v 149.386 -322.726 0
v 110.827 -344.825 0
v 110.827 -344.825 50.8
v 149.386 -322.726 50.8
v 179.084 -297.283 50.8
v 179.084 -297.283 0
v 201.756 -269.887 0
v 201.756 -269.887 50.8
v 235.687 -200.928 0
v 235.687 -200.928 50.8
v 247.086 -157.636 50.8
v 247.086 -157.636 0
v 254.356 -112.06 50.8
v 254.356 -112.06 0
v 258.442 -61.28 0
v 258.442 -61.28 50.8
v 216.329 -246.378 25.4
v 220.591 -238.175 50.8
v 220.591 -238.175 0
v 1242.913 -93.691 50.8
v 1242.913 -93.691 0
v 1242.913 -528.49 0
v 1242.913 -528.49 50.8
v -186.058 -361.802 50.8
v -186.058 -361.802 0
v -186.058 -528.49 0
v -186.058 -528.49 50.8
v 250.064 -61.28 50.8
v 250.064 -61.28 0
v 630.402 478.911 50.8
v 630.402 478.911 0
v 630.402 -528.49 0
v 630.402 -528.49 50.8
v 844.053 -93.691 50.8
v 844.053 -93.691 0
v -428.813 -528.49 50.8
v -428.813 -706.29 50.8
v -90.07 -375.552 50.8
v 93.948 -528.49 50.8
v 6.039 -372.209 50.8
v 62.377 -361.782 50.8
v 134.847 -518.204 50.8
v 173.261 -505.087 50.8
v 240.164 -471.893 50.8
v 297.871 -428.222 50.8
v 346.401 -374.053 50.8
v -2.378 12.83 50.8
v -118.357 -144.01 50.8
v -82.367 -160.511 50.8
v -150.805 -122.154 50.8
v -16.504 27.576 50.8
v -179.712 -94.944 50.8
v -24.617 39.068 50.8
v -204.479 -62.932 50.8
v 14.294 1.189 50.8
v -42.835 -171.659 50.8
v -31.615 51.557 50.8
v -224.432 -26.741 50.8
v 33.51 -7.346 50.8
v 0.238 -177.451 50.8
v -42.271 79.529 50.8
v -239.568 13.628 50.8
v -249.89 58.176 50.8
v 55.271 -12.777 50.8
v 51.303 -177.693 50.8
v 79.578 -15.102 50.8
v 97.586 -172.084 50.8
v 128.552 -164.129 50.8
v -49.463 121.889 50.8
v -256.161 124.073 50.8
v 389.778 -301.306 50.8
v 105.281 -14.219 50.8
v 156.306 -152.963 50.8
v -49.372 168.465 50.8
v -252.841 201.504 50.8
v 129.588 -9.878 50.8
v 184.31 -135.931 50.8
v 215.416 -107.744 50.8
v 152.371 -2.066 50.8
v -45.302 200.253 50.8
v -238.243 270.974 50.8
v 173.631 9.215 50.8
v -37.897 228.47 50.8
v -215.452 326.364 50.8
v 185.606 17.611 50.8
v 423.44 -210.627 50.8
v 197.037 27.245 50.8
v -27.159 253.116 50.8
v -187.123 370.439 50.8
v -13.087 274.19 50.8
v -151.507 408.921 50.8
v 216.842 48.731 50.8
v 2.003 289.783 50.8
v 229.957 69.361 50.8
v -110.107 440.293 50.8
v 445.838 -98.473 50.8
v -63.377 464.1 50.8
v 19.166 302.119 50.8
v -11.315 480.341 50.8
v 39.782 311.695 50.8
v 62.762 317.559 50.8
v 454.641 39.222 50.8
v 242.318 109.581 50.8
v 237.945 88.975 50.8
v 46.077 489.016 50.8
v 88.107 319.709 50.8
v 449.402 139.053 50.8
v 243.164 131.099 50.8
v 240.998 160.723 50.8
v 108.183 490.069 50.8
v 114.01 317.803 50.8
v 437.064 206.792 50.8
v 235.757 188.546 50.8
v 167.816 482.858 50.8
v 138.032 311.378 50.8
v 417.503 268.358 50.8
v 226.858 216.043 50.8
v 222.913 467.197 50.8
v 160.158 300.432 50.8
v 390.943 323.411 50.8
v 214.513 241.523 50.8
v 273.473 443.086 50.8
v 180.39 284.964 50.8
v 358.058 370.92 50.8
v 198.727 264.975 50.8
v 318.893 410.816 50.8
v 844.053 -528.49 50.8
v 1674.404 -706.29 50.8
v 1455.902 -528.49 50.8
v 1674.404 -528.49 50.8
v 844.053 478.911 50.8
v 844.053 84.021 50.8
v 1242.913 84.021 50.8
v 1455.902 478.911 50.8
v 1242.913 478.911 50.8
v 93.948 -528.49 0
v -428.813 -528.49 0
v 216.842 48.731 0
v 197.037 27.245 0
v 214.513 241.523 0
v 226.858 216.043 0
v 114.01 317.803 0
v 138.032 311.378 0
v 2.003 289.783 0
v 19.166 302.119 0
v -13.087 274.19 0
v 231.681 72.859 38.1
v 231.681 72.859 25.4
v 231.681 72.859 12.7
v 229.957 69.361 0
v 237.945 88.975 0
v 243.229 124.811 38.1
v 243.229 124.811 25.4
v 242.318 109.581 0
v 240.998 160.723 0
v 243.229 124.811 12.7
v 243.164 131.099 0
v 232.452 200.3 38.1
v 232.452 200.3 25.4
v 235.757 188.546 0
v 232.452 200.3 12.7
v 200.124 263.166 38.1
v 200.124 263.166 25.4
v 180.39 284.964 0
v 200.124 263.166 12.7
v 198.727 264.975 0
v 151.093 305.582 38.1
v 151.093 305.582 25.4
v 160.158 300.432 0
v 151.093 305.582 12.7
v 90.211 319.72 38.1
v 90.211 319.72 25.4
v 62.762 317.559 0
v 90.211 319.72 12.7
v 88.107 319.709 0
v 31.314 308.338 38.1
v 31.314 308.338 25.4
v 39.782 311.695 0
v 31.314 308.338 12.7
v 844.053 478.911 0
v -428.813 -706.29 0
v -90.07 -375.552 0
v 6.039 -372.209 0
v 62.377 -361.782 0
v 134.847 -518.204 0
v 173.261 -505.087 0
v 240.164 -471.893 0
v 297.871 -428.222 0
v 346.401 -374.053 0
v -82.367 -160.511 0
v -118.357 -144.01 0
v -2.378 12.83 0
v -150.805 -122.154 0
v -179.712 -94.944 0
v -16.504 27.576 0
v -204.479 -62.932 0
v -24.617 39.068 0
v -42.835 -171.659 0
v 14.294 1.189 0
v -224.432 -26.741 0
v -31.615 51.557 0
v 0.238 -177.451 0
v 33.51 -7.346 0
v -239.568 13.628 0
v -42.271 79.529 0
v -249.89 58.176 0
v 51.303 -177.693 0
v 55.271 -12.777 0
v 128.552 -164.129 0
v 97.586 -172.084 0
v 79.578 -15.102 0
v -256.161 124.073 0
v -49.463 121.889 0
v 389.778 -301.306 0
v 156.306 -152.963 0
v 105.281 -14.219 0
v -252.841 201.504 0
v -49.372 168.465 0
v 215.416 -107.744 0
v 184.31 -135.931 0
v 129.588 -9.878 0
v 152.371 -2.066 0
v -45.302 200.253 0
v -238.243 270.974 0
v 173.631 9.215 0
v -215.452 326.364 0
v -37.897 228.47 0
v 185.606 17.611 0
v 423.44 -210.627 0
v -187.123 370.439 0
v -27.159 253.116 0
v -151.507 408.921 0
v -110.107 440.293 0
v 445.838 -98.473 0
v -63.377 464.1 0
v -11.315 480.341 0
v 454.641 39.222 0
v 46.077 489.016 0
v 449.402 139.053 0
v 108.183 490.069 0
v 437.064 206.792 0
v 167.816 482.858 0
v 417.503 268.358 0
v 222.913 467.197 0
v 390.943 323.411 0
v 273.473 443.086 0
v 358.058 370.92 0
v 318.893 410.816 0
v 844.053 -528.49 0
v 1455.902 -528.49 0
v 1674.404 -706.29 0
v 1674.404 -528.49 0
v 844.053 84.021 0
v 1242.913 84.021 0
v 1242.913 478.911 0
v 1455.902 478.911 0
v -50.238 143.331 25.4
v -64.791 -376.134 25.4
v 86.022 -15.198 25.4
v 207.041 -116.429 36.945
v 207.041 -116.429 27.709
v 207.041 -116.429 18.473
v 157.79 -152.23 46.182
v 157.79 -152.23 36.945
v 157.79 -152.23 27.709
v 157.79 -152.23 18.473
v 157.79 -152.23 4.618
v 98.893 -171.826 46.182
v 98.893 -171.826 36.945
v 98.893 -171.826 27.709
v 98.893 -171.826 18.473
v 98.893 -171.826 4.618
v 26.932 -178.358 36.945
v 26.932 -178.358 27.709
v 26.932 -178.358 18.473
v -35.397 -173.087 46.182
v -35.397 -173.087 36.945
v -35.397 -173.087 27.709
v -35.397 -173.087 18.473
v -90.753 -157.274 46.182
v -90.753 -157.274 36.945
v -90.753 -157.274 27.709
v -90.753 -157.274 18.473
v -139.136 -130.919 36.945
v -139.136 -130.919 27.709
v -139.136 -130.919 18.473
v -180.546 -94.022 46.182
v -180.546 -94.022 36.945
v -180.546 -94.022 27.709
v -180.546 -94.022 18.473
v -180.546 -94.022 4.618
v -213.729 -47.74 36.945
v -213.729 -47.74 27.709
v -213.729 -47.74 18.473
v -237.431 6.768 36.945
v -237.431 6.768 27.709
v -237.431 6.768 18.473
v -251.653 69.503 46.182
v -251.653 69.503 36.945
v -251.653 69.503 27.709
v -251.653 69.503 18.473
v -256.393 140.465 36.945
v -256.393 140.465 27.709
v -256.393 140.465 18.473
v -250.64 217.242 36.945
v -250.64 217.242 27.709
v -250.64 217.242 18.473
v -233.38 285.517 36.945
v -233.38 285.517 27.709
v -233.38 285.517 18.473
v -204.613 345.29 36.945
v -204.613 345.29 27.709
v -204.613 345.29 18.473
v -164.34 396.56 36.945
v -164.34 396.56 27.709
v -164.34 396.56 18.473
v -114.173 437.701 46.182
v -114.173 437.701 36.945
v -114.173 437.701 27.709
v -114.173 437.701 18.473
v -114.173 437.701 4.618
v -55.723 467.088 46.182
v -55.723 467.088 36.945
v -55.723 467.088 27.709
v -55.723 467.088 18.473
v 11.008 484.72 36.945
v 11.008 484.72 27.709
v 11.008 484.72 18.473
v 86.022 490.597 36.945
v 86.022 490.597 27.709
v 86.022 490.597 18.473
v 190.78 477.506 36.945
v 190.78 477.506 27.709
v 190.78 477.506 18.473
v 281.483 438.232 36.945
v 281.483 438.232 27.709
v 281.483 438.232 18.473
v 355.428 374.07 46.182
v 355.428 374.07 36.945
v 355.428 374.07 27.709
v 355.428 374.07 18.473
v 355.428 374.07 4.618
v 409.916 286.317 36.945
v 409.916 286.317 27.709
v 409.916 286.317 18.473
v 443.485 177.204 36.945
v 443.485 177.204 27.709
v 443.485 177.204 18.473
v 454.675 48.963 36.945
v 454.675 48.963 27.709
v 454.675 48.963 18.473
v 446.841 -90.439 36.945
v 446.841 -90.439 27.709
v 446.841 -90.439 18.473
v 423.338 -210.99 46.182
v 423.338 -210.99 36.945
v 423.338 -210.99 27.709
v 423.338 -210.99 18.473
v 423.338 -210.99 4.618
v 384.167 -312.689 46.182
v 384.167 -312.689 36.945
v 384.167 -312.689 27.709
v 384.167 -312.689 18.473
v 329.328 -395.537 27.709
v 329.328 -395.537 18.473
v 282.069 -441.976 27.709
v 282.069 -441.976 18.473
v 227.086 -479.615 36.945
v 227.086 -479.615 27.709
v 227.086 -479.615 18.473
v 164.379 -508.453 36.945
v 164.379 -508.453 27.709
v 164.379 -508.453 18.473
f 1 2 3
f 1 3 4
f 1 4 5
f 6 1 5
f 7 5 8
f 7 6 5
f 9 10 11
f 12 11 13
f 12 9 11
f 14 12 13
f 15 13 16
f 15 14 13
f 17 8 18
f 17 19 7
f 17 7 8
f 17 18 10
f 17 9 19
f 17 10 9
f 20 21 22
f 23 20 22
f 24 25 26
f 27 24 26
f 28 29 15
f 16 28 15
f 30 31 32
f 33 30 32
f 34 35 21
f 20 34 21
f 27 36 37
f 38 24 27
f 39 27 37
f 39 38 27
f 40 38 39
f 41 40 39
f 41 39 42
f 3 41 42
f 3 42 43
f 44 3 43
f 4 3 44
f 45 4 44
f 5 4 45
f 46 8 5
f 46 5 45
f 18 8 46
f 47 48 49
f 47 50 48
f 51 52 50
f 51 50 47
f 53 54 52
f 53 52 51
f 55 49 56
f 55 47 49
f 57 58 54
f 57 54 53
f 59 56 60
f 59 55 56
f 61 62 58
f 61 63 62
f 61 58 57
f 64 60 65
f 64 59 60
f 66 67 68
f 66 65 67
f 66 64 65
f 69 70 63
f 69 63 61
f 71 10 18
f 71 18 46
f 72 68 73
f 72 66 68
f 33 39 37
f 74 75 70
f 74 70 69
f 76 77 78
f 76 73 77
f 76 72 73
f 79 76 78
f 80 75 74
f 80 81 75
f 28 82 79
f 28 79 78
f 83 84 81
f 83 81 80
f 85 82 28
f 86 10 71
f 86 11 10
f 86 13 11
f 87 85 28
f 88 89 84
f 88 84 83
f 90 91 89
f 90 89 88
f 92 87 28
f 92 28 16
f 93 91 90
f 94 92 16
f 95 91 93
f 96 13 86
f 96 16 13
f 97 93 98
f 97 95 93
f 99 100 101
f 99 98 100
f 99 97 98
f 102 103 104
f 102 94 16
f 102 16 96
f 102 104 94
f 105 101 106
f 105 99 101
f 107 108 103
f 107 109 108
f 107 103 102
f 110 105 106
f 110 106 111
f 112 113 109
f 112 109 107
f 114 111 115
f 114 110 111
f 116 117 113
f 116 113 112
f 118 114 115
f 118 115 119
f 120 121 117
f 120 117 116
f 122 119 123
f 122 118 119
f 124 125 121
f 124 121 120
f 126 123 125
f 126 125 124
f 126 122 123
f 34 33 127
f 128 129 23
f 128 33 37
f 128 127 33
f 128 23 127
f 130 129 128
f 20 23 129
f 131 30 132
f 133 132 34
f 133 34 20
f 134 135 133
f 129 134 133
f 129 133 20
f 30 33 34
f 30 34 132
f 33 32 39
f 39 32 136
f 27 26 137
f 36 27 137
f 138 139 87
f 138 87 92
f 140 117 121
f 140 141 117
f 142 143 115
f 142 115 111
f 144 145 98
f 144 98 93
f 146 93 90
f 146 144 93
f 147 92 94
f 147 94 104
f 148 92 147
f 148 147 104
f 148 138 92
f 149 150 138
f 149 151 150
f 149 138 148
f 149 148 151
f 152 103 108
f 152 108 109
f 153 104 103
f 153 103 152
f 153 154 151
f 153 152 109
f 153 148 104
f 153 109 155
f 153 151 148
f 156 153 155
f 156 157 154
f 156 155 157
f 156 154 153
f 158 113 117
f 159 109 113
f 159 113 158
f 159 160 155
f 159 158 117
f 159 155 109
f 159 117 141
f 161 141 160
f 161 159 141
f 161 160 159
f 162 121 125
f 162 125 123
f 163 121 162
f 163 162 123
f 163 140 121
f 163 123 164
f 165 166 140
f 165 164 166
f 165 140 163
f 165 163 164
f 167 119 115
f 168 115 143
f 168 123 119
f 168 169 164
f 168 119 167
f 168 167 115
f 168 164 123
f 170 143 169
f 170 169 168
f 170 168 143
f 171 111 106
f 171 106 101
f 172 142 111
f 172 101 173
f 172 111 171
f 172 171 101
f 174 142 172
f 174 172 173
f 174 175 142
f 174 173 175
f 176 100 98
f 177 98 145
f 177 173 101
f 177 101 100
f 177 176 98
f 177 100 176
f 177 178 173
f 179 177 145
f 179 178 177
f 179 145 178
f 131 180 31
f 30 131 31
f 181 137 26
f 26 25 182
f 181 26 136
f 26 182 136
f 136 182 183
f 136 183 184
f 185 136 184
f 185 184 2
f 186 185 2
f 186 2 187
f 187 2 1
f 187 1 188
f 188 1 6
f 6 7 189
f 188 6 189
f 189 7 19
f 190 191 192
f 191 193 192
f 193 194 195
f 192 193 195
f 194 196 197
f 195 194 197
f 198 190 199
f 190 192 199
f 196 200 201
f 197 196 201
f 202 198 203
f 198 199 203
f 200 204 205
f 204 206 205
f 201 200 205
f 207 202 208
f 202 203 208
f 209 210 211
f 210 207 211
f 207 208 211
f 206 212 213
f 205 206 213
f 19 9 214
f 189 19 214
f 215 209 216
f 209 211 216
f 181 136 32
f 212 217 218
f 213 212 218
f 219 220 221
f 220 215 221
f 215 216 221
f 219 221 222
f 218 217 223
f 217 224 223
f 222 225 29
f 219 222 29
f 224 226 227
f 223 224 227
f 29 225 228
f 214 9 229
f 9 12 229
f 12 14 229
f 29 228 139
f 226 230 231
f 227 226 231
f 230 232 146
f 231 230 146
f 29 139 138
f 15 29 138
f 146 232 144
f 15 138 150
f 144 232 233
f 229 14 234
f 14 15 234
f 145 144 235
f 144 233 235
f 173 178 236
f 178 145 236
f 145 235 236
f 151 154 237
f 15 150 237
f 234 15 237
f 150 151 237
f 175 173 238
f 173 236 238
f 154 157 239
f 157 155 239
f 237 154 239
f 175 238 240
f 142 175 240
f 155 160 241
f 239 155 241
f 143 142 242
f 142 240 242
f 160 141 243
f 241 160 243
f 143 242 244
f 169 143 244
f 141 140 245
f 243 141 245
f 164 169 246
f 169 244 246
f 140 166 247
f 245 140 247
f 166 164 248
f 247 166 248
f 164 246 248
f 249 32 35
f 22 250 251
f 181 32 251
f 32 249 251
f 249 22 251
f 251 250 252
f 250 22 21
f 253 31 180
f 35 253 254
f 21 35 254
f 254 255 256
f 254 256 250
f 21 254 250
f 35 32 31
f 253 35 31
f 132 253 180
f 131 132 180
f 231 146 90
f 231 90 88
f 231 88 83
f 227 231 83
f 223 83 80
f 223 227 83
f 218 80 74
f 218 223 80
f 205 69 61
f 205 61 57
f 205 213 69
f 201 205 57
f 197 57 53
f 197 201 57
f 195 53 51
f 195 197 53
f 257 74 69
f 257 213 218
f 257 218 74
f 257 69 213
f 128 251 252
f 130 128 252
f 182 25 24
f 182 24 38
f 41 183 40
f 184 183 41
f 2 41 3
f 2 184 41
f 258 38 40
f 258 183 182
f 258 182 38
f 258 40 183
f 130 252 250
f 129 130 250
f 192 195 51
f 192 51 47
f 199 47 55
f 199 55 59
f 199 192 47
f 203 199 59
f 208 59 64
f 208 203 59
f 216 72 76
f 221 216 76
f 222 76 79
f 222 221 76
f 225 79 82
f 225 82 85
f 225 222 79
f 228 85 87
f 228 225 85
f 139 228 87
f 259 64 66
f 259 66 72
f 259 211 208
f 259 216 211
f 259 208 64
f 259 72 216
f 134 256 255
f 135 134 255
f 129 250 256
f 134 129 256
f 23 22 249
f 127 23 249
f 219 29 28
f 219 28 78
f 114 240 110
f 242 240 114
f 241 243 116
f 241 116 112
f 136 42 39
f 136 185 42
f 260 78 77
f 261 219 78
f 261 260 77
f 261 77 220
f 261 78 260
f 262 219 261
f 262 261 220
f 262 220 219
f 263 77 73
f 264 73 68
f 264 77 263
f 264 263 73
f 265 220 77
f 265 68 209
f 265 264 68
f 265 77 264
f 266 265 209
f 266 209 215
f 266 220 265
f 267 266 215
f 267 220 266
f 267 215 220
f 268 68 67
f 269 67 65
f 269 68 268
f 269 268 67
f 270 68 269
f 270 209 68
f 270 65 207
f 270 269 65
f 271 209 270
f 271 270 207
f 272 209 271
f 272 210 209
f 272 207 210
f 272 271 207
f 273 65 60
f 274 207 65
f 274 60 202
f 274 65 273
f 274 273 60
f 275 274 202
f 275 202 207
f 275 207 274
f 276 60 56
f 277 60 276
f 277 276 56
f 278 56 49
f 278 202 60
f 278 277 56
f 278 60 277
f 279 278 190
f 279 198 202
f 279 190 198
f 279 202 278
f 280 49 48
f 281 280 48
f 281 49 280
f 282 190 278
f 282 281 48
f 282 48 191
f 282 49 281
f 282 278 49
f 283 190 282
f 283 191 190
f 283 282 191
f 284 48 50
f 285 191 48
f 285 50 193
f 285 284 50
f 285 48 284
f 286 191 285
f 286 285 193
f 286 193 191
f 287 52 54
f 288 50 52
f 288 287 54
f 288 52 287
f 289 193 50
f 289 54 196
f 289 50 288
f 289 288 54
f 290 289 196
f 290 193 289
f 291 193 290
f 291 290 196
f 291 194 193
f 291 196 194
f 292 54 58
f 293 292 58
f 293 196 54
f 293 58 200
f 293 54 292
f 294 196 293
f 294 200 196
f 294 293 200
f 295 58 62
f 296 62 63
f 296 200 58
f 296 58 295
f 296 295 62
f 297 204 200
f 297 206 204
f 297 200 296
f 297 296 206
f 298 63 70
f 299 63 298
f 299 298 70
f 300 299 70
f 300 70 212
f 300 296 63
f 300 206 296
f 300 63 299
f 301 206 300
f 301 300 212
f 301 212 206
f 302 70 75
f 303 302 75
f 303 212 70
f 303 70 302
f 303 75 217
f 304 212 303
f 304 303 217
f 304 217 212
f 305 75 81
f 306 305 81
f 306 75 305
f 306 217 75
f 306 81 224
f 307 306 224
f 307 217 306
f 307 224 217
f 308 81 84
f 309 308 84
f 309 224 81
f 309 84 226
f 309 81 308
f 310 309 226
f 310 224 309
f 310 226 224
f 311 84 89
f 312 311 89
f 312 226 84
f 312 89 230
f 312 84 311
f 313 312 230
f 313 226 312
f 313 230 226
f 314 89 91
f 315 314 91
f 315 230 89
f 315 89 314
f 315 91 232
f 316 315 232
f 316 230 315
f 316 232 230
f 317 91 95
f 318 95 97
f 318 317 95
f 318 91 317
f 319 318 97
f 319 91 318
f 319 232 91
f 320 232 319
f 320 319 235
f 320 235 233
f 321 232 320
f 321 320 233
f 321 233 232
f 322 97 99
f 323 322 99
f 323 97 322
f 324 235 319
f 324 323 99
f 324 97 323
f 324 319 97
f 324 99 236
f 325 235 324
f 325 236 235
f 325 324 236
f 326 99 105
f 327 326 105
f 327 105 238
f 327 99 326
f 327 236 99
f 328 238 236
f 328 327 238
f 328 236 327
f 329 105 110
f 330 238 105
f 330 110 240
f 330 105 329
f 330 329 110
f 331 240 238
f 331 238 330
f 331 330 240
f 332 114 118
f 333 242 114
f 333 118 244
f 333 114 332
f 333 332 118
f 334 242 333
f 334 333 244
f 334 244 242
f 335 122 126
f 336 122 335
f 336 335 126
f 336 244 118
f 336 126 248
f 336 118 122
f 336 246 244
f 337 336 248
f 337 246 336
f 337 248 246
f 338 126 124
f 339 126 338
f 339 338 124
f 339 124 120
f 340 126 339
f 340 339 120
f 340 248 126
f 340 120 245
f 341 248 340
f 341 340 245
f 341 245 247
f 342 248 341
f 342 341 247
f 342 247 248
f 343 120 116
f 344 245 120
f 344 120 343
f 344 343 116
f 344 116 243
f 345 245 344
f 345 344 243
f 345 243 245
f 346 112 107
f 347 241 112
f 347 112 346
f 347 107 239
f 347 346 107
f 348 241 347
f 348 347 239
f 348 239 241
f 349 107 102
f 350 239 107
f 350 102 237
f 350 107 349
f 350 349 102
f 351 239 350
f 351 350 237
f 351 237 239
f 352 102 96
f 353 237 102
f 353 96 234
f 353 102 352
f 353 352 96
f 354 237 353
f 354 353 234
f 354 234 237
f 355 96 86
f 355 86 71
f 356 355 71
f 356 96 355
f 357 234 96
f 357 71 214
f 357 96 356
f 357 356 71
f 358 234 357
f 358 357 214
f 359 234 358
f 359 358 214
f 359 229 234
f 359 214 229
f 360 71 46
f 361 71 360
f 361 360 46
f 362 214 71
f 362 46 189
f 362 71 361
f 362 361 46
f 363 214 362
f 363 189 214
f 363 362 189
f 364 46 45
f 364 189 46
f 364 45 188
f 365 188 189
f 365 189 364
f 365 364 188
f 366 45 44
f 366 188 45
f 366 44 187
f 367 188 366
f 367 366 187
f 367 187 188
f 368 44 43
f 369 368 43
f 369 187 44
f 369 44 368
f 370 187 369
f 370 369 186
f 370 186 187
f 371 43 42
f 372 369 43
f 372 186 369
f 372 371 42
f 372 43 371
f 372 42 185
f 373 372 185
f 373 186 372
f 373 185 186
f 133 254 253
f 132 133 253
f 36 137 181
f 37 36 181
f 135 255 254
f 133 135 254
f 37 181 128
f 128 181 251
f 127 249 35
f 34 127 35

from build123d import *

# Parameters (mm, degrees)
F1_DEPTH = 50.8


# Not quite as in the source:
# - a feature names something its author has since deleted; it is built from what else it names


with BuildPart() as f1:
    # F0 (on Top) → F1 (new body)
    with BuildSketch(Plane.XY):
        with BuildLine():
            Line((-428.8131256104, -528.4897685051), (-428.8131256104, -706.2897685051))
            Line((-428.8131256104, -706.2897685051), (1674.4038882785, -706.2897685051))
            Line((1674.4038882785, -706.2897685051), (1674.4038882785, -528.4897685051))
            Line((1674.4038882785, -528.4897685051), (1455.9021521674, -528.4897685051))
            Line((1455.9021521674, -528.4897685051), (1242.9125688341, -528.4897685051))
            Line((1242.9125688341, -528.4897685051), (844.0531938341, -528.4897685051))
            Line((844.0531938341, -528.4897685051), (630.4021521674, -528.4897685051))
            Line((630.4021521674, -528.4897685051), (93.9480274003, -528.4897685051))
            add(Edge.make_bspline(
                [(93.9480274003, -528.4897685051), (27.9501754164, -542.3803935051), (-50.2384728326, -542.3803935051)],
                knots=[0.6924376574, 0.6924376574, 0.6924376574, 1, 1, 1], degree=2))
            add(Edge.make_bspline(
                [(-50.2384728326, -542.3803935051), (-139.9763200548, -542.3803935051), (-186.057917277, -532.6790046162)],
                knots=[0, 0, 0, 1, 1, 1], degree=2))
            Line((-186.057917277, -532.6790046162), (-186.057917277, -528.4897685051))
            Line((-186.057917277, -528.4897685051), (-428.8131256104, -528.4897685051))
        make_face()
        Polygon((1242.9125688341, -528.4897685051), (1455.9021521674, -528.4897685051), (1455.9021521674, 478.9112731616), (1242.9125688341, 478.9112731616), (1242.9125688341, 84.0206481616), (844.0531938341, 84.0206481616), (844.0531938341, 478.9112731616), (630.4021521674, 478.9112731616), (630.4021521674, -528.4897685051), (844.0531938341, -528.4897685051), (844.0531938341, -93.691157394), (1242.9125688341, -93.691157394), align=None)
        with BuildLine():
            Line((-186.057917277, -361.8022685051), (-186.057917277, -528.4897685051))
            Line((-186.057917277, -528.4897685051), (93.9480274003, -528.4897685051))
            add(Edge.make_bspline(
                [(329.3283674452, -395.5366435051), (242.5338316042, -497.2167857568), (93.9480274003, -528.4897685051)],
                knots=[0, 0, 0, 0.6924376574, 0.6924376574, 0.6924376574], degree=2))
            add(Edge.make_bspline(
                [(454.6747216119, 48.9633564949), (454.6747216119, -248.6928935051), (329.3283674452, -395.5366435051)],
                knots=[0, 0, 0, 1, 1, 1], degree=2))
            add(Edge.make_bspline(
                [(409.9160410563, 286.316655106), (454.6747216119, 186.7671759393), (454.6747216119, 48.9633564949)],
                knots=[0, 0, 0, 1, 1, 1], degree=2))
            add(Edge.make_bspline(
                [(281.4828813341, 438.2315856616), (365.1573605008, 385.8661342727), (409.9160410563, 286.316655106)],
                knots=[0, 0, 0, 1, 1, 1], degree=2))
            add(Edge.make_bspline(
                [(86.0219438341, 490.5970370505), (197.8084021674, 490.5970370505), (281.4828813341, 438.2315856616)],
                knots=[0, 0, 0, 1, 1, 1], degree=2))
            add(Edge.make_bspline(
                [(-164.3400353326, 396.5597106616), (-72.2870839437, 490.5970370505), (86.0219438341, 490.5970370505)],
                knots=[0, 0, 0, 1, 1, 1], degree=2))
            add(Edge.make_bspline(
                [(-256.3929867215, 140.465092606), (-256.3929867215, 302.5223842727), (-164.3400353326, 396.5597106616)],
                knots=[0, 0, 0, 1, 1, 1], degree=2))
            add(Edge.make_bspline(
                [(-180.5457644992, -94.0218865607), (-256.3929867215, -9.6859490607), (-256.3929867215, 140.465092606)],
                knots=[0, 0, 0, 1, 1, 1], degree=2))
            add(Edge.make_bspline(
                [(26.9316660563, -178.3578240607), (-104.698542277, -178.3578240607), (-180.5457644992, -94.0218865607)],
                knots=[0, 0, 0, 1, 1, 1], degree=2))
            add(Edge.make_bspline(
                [(157.7901730008, -152.230219894), (105.4247216119, -178.3578240607), (26.9316660563, -178.3578240607)],
                knots=[0, 0, 0, 1, 1, 1], degree=2))
            add(Edge.make_bspline(
                [(250.0636105008, -61.2796990607), (210.1556243896, -126.1026157273), (157.7901730008, -152.230219894)],
                knots=[0, 0, 0, 1, 1, 1], degree=2))
            Line((250.0636105008, -61.2796990607), (258.442082723, -61.2796990607))
            add(Edge.make_bspline(
                [(216.3292355008, -246.3777893384), (252.9299299452, -179.2397685051), (258.442082723, -61.2796990607)],
                knots=[0, 0, 0, 1, 1, 1], degree=2))
            add(Edge.make_bspline(
                [(110.8266313341, -344.8248379495), (179.7285410563, -313.5158101718), (216.3292355008, -246.3777893384)],
                knots=[0, 0, 0, 1, 1, 1], degree=2))
            add(Edge.make_bspline(
                [(-64.7905561659, -376.1338657273), (41.9247216119, -376.1338657273), (110.8266313341, -344.8248379495)],
                knots=[0, 0, 0, 1, 1, 1], degree=2))
            add(Edge.make_bspline(
                [(-186.057917277, -361.8022685051), (-128.0700700548, -376.1338657273), (-64.7905561659, -376.1338657273)],
                knots=[0, 0, 0, 1, 1, 1], degree=2))
        make_face()
        with BuildLine():
            add(Edge.make_bspline(
                [(90.2111799452, 319.7203009393), (24.0653466119, 319.7203009393), (-13.0865631104, 274.1899189949)],
                knots=[0, 0, 0, 1, 1, 1], degree=2))
            add(Edge.make_bspline(
                [(200.1235063341, 263.1656134393), (157.0184716119, 319.7203009393), (90.2111799452, 319.7203009393)],
                knots=[0, 0, 0, 1, 1, 1], degree=2))
            add(Edge.make_bspline(
                [(243.2285410563, 124.8105787171), (243.2285410563, 206.6109259393), (200.1235063341, 263.1656134393)],
                knots=[0, 0, 0, 1, 1, 1], degree=2))
            add(Edge.make_bspline(
                [(197.0367007785, 27.2454745505), (243.2285410563, 69.6890509393), (243.2285410563, 124.8105787171)],
                knots=[0, 0, 0, 1, 1, 1], degree=2))
            add(Edge.make_bspline(
                [(86.0219438341, -15.1981018384), (150.8448605008, -15.1981018384), (197.0367007785, 27.2454745505)],
                knots=[0, 0, 0, 1, 1, 1], degree=2))
            add(Edge.make_bspline(
                [(-16.5040978326, 27.5762037171), (17.2302771674, -15.1981018384), (86.0219438341, -15.1981018384)],
                knots=[0, 0, 0, 1, 1, 1], degree=2))
            add(Edge.make_bspline(
                [(-50.2384728326, 143.3314120505), (-50.2384728326, 70.3505092727), (-16.5040978326, 27.5762037171)],
                knots=[0, 0, 0, 1, 1, 1], degree=2))
            add(Edge.make_bspline(
                [(-13.0865631104, 274.1899189949), (-50.2384728326, 228.6595370505), (-50.2384728326, 143.3314120505)],
                knots=[0, 0, 0, 1, 1, 1], degree=2))
        make_face(mode=Mode.SUBTRACT)
        with BuildLine():
            Line((93.9480274003, -528.4897685051), (-186.057917277, -528.4897685051))
            Line((-186.057917277, -528.4897685051), (-186.057917277, -532.6790046162))
            add(Edge.make_bspline(
                [(-50.2384728326, -542.3803935051), (-139.9763200548, -542.3803935051), (-186.057917277, -532.6790046162)],
                knots=[0, 0, 0, 1, 1, 1], degree=2))
            add(Edge.make_bspline(
                [(93.9480274003, -528.4897685051), (27.9501754164, -542.3803935051), (-50.2384728326, -542.3803935051)],
                knots=[0.6924376574, 0.6924376574, 0.6924376574, 1, 1, 1], degree=2))
        make_face()
    extrude(amount=F1_DEPTH)


solid = f1.part
